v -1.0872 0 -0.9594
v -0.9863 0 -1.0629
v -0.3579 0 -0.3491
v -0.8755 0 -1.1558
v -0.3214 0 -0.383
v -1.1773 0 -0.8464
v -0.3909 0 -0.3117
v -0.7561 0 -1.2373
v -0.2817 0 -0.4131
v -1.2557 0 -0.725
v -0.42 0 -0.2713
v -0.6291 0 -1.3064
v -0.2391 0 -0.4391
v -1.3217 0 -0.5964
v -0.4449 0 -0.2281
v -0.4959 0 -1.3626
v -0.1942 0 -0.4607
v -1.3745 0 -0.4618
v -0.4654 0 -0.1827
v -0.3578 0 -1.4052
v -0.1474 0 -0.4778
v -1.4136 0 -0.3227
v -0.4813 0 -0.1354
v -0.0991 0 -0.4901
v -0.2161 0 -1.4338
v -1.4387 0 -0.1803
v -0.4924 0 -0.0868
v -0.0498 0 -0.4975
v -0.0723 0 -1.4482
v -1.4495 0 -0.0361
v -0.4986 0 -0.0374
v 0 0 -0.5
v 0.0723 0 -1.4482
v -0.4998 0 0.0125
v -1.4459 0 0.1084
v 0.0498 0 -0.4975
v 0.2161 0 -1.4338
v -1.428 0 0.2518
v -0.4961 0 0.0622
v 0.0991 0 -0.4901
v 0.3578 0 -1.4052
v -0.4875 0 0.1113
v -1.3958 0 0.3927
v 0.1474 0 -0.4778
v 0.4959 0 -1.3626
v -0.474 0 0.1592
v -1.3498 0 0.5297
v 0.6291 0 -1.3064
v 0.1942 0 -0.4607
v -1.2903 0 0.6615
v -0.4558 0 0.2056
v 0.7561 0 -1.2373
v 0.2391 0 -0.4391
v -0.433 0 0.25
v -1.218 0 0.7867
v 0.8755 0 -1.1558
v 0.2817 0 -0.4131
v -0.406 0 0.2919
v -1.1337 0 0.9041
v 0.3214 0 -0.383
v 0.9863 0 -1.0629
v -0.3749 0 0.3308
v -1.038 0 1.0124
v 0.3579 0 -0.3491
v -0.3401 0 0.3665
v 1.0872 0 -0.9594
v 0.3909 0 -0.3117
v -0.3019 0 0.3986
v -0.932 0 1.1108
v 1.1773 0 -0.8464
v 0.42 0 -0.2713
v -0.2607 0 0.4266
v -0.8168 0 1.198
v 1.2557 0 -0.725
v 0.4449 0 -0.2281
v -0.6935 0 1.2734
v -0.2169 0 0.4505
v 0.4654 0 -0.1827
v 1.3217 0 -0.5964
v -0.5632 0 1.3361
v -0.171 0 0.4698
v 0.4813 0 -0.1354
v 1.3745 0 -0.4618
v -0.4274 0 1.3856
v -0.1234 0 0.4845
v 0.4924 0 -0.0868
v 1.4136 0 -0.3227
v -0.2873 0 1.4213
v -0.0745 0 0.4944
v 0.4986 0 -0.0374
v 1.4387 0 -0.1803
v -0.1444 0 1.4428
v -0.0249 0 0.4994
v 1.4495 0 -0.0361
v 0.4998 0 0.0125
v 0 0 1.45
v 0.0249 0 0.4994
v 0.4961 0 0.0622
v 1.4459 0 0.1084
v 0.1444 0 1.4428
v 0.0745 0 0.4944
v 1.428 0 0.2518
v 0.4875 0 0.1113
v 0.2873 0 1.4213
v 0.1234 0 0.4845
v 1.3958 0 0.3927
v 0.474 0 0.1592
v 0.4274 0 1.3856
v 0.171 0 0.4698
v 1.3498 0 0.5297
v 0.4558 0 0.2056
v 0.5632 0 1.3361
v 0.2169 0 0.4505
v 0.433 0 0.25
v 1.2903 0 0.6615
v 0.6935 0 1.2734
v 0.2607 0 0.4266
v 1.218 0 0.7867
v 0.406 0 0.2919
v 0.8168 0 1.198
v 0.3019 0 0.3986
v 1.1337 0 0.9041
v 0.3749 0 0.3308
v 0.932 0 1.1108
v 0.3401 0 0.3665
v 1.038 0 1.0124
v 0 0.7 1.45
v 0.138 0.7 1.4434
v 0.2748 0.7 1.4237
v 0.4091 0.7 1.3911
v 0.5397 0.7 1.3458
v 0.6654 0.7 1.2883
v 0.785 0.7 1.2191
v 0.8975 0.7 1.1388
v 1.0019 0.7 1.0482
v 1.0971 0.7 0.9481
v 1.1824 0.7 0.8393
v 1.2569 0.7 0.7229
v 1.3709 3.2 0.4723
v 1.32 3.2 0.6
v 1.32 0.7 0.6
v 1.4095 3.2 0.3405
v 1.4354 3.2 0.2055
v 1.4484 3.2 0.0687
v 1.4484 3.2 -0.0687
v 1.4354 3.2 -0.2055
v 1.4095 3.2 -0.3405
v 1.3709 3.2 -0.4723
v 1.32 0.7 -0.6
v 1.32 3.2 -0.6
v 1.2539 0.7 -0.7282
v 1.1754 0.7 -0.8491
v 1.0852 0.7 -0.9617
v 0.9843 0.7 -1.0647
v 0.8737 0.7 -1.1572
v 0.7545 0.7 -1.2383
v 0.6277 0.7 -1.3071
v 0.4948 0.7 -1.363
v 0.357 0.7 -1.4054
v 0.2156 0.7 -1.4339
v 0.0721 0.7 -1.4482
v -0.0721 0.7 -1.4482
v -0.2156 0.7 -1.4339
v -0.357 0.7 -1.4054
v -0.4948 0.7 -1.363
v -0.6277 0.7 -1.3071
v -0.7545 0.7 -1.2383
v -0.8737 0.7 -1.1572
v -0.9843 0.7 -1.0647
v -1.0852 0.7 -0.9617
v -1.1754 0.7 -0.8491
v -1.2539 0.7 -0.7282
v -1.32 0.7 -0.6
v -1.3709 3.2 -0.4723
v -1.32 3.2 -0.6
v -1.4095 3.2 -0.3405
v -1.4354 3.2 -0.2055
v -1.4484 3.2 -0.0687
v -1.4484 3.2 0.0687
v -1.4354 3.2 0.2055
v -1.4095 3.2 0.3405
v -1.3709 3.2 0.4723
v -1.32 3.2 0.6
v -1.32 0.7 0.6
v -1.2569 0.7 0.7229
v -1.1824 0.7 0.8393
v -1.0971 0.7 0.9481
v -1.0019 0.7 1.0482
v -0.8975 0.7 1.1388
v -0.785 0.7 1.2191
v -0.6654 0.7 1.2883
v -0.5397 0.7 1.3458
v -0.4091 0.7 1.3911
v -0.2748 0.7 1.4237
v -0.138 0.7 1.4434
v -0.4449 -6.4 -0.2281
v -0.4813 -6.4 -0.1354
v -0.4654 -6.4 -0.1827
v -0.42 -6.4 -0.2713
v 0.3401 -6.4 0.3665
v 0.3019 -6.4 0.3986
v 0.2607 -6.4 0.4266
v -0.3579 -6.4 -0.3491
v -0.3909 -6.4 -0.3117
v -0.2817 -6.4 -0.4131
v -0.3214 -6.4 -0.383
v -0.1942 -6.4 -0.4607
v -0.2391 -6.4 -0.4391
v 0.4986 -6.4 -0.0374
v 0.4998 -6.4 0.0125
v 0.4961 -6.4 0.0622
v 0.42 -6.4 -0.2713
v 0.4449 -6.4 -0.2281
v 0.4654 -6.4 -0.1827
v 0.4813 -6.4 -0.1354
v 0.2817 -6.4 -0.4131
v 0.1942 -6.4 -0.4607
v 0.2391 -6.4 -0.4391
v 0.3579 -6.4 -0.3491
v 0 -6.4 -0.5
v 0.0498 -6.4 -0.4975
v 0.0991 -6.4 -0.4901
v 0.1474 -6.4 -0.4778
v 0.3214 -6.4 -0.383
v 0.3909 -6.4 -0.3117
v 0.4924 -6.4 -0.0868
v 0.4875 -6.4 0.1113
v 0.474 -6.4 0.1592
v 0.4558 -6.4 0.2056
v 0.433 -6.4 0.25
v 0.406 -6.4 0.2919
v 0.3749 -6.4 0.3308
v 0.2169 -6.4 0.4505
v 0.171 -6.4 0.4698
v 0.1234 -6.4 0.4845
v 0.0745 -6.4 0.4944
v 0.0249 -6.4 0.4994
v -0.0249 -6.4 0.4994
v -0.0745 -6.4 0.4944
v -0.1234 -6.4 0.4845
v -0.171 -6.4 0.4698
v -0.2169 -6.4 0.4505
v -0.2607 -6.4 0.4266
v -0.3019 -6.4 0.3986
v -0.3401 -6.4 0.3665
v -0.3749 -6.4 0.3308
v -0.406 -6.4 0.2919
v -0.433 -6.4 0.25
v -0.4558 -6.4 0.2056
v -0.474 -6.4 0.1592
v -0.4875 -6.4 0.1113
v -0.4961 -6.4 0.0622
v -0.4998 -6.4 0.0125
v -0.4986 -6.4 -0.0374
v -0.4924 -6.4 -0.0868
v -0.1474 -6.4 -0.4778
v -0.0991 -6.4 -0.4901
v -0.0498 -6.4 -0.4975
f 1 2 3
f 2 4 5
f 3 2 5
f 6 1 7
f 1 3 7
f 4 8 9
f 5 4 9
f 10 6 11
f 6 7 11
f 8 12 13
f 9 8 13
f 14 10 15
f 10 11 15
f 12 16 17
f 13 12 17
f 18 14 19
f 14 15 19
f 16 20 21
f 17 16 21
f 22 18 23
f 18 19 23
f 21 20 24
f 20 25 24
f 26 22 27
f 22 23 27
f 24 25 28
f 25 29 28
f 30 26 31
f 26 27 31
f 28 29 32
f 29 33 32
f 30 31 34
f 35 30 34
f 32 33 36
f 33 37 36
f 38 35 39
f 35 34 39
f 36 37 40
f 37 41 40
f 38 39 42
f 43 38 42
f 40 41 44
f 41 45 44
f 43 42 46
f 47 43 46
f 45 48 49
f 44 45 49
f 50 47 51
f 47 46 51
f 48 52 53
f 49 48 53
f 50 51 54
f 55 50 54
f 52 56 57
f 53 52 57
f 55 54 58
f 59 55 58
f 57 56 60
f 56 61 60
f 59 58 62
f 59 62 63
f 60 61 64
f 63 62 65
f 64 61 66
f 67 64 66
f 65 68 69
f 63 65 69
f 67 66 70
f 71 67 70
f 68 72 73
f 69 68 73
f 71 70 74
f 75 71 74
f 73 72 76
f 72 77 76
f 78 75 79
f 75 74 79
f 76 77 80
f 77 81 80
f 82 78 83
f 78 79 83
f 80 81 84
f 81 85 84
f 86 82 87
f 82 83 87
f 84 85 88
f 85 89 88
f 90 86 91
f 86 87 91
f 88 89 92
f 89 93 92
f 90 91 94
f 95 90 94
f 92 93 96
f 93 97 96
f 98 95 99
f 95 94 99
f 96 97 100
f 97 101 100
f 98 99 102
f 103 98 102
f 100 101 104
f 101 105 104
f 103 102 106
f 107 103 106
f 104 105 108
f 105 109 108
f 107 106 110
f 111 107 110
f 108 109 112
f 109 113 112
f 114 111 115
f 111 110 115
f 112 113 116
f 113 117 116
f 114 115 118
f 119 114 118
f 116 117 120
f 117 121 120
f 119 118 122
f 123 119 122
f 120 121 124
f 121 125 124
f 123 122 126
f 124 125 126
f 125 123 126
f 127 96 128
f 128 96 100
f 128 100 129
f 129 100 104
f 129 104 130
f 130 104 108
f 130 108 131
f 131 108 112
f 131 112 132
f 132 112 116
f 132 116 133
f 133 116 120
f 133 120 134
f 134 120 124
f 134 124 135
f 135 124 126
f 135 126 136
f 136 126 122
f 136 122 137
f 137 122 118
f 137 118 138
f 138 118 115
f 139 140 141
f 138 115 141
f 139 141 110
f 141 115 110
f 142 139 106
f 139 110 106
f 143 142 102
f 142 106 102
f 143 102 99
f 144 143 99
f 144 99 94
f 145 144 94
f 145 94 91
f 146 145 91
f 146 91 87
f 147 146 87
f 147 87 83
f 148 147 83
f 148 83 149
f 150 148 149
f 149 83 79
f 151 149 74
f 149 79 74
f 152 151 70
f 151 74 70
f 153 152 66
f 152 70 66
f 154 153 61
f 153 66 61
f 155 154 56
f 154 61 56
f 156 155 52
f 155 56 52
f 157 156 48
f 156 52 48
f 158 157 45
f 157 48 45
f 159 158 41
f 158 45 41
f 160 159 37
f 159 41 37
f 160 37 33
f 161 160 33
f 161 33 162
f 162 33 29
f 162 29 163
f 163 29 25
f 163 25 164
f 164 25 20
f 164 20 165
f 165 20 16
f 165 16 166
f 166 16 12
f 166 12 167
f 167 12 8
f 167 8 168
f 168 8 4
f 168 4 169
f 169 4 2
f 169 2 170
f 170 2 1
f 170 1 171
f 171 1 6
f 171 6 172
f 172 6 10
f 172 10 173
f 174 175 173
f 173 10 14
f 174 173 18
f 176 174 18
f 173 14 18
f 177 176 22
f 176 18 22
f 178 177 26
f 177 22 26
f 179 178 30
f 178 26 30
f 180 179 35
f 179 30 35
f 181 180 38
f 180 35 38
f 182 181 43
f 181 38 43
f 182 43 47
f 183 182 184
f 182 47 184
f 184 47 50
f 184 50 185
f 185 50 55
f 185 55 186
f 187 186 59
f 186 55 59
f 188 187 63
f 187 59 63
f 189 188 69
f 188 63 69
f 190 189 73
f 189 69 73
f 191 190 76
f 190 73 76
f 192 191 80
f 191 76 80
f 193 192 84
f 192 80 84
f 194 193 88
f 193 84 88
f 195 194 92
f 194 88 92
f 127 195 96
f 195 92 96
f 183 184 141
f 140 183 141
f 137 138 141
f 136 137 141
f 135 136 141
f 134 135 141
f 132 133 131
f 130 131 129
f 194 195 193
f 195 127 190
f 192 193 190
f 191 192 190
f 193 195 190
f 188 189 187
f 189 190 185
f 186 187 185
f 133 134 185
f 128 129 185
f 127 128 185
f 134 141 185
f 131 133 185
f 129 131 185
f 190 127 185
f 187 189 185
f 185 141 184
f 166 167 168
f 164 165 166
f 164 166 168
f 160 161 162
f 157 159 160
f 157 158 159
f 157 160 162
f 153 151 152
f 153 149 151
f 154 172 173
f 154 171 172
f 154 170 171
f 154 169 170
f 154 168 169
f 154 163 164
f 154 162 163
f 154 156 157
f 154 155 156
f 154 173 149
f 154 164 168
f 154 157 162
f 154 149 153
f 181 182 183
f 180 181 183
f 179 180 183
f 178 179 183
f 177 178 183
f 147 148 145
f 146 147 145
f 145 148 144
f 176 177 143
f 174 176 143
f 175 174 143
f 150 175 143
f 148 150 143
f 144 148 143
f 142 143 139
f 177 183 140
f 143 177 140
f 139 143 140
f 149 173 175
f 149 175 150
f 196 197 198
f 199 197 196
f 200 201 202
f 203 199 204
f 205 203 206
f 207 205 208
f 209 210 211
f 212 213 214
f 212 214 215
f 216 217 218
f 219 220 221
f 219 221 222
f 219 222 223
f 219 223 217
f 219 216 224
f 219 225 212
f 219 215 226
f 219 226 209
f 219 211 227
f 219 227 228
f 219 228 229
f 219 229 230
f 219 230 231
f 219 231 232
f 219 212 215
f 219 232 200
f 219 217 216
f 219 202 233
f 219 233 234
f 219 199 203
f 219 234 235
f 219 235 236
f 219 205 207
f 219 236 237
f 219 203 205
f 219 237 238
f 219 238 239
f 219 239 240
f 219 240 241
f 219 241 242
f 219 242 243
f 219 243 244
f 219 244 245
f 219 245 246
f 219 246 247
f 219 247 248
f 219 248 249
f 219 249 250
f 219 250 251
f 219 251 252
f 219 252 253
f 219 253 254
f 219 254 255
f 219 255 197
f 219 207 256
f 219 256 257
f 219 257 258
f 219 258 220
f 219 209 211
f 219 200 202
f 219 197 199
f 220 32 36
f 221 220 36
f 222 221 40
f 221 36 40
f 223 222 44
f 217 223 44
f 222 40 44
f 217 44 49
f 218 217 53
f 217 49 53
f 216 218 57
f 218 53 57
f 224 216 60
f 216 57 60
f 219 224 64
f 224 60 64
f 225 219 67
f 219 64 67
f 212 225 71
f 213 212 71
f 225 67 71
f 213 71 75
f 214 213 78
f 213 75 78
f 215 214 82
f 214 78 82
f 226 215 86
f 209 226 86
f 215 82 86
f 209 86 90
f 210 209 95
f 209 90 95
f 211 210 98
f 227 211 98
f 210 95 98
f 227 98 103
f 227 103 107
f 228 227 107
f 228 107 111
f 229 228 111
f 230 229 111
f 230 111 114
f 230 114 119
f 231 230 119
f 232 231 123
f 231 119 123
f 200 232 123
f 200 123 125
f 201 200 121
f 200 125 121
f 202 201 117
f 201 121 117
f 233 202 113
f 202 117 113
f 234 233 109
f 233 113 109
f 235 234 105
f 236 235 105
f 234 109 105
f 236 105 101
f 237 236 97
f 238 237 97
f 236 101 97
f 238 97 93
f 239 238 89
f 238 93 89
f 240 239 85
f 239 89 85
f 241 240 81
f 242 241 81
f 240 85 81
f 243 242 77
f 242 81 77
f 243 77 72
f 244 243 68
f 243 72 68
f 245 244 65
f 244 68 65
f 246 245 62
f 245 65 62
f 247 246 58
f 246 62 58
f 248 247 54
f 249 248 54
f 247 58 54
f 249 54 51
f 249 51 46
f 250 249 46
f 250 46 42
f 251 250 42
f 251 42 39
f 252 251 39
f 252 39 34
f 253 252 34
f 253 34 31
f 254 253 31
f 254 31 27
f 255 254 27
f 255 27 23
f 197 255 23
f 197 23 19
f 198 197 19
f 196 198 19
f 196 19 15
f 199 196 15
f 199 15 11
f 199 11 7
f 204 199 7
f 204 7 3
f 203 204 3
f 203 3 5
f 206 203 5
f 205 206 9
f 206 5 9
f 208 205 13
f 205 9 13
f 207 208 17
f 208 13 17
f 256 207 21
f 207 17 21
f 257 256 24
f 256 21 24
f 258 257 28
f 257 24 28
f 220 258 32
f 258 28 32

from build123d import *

# Parameters (mm, degrees)
CROQUIS1_R              = 1.45
SALIENTE_EXTRUIR1_DEPTH = 10.7
CORTAR_EXTRUIR1_START   = -6
CORTAR_EXTRUIR1_DEPTH   = 6
CROQUIS3_R              = 0.5
SALIENTE_EXTRUIR2_DEPTH = 6.4
CUT_EXTRUDE1_START      = -10
CUT_EXTRUDE1_DEPTH      = 10
SKETCH2_W               = 6.740875304
SKETCH2_H               = 8.89846687
CUT_EXTRUDE2_DEPTH      = 11.990677868


with BuildPart() as part:
    # Croquis1 → Saliente-Extruir1 (new body)
    with BuildSketch(Plane(origin=(0, 0, 0), x_dir=(1, 0, 0), z_dir=(0, 1, 0))):
        with Locations(Location((0, 0, 0), (0, 0, 270))):
            Circle(CROQUIS1_R)
    extrude(amount=SALIENTE_EXTRUIR1_DEPTH)

    # Croquis2 → Cortar-Extruir1 (cut)
    with BuildSketch(Plane(origin=(0, 10.7, 0), x_dir=(1, 0, 0), z_dir=(0, 1, 0)).offset(CORTAR_EXTRUIR1_START)):
        with BuildLine():
            Line((-1, -1.05), (1, -1.05))
            ThreePointArc((1, -1.05), (0, -1.45), (-1, -1.05))
        make_face()
    extrude(amount=CORTAR_EXTRUIR1_DEPTH, mode=Mode.SUBTRACT)

    # Croquis3 → Saliente-Extruir2 (add)
    with BuildSketch(Plane.XZ):
        with Locations(Location((0, 0, 0), (0, 0, 270))):
            Circle(CROQUIS3_R)
    extrude(amount=SALIENTE_EXTRUIR2_DEPTH)

    # Sketch1 → Cut-Extrude1 (cut)
    with BuildSketch(Plane(origin=(0, 10.7, 0), x_dir=(1, 0, 0), z_dir=(0, 1, 0)).offset(CUT_EXTRUDE1_START)):
        with BuildLine():
            Line((-1.942782437, 0.6), (1.942782437, 0.6))
            ThreePointArc((1.942782437, 0.6), (0, 2.033323289), (-1.942782437, 0.6))
        make_face()
        with BuildLine():
            Line((-1.942782437, -0.6), (1.942782437, -0.6))
            ThreePointArc((1.942782437, -0.6), (0, -2.033323289), (-1.942782437, -0.6))
        make_face()
    extrude(amount=CUT_EXTRUDE1_DEPTH, mode=Mode.SUBTRACT)

    # Sketch2 → Cut-Extrude2 (cut, through all)
    with BuildSketch(Plane.XY.offset(0.6)):
        with Locations((0.223130537, 7.649233435)):
            Rectangle(SKETCH2_W, SKETCH2_H)
    extrude(amount=-CUT_EXTRUDE2_DEPTH, mode=Mode.SUBTRACT)


solid = part.part
